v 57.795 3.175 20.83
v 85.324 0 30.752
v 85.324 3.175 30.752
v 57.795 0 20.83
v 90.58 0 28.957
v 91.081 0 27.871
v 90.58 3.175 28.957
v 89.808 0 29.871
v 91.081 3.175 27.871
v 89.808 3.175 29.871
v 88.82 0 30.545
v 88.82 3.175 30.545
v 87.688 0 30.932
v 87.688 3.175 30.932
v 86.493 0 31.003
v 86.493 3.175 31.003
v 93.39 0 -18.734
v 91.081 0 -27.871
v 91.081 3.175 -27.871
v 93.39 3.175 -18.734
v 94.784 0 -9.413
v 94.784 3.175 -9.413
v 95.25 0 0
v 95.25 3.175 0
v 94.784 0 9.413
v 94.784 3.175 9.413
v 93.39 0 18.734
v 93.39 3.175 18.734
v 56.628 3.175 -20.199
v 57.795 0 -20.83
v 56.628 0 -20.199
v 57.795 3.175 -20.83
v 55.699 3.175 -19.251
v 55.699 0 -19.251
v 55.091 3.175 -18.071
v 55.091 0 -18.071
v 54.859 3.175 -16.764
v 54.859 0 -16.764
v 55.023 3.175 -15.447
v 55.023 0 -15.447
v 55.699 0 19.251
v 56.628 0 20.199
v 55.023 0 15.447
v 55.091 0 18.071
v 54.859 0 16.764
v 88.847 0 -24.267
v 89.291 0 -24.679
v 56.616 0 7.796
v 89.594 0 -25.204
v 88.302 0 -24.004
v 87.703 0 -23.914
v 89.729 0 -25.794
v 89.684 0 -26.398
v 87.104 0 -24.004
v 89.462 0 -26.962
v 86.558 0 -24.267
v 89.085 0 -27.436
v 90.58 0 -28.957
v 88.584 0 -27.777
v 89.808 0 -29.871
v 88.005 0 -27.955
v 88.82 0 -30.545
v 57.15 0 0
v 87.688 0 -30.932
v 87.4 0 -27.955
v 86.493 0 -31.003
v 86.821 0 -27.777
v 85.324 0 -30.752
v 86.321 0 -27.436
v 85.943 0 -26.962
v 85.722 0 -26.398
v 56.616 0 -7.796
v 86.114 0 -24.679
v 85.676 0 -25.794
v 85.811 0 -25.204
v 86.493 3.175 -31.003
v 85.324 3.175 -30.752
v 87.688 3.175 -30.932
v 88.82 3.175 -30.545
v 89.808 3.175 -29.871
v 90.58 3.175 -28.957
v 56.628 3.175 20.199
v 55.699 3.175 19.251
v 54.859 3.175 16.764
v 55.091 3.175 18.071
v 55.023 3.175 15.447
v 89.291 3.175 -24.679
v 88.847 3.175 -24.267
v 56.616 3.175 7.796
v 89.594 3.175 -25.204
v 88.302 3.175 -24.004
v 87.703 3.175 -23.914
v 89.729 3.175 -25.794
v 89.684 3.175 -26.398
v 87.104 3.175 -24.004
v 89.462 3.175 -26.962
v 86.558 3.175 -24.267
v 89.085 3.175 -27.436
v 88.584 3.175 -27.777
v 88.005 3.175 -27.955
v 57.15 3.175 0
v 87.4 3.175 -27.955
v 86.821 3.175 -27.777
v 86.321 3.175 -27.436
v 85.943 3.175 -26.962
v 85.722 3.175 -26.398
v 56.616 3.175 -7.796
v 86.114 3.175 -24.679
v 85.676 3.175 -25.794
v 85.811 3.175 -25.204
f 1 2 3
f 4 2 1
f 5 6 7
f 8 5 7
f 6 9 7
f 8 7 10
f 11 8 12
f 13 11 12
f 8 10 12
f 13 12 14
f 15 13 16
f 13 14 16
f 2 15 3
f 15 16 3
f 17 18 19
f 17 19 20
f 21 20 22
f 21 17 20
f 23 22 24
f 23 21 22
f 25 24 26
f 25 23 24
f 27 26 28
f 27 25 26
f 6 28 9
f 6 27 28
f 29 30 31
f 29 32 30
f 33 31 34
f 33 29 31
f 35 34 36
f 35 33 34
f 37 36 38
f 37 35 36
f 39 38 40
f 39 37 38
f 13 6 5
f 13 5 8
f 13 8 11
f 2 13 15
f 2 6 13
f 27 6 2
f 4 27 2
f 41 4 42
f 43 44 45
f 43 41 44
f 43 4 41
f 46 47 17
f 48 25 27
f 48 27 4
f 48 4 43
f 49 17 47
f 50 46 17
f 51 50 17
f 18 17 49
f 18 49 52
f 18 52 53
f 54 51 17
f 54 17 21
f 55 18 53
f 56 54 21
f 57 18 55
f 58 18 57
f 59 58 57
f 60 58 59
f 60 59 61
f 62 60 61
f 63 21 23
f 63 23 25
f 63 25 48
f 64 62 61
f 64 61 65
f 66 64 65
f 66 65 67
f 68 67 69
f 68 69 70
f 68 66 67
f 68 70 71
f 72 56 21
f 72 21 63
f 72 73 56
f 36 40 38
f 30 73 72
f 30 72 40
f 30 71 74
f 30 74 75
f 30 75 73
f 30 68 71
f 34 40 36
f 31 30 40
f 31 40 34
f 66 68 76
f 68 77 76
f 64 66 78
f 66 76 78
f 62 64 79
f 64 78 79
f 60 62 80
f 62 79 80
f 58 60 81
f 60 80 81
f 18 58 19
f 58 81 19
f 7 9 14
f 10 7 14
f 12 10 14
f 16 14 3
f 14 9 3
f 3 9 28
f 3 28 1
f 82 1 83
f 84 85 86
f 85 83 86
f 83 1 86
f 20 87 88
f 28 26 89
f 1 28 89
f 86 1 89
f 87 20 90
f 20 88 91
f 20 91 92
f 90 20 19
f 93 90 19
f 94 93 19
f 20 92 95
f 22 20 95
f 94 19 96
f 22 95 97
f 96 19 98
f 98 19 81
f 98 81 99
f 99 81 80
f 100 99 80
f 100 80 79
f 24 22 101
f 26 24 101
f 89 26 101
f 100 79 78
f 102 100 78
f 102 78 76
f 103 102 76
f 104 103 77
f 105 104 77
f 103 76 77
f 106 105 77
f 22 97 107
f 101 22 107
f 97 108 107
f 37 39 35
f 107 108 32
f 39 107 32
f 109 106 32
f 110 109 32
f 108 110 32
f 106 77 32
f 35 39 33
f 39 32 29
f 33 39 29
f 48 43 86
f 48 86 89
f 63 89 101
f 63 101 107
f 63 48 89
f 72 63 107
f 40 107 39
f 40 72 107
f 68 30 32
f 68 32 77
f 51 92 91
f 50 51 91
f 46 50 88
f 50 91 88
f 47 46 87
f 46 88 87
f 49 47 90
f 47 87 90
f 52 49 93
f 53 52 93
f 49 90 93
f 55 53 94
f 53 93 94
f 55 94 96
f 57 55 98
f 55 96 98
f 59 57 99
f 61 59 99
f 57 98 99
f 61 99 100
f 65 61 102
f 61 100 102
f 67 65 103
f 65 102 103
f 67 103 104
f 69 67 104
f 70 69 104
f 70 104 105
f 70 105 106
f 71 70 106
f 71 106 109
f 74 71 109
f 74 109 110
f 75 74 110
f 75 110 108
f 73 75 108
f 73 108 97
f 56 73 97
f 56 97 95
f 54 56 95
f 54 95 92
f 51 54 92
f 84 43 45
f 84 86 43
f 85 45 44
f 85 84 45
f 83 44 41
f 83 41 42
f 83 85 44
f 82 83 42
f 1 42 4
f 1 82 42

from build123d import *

# Parameters (mm, degrees)
BOSS_EXTRUDE1_DEPTH = 3.175
SKETCH2_R           = 2.032
CUT_EXTRUDE1_DEPTH  = 101.626437428
FILLET1_R           = 4.445


with BuildPart() as part:
    # Sketch1 → Boss-Extrude1 (new body)
    with BuildSketch(Plane(origin=(0, 0, 0), x_dir=(1, 0, 0), z_dir=(0, 1, 0))):
        with BuildLine():
            Line((53.764572514, 19.37764801), (89.607620856, 32.296080017))
            ThreePointArc((89.607620856, 32.296080017), (95.25, 0), (89.607620856, -32.296080017))
            Line((89.607620856, -32.296080017), (53.764572514, -19.37764801))
            ThreePointArc((53.764572514, -19.37764801), (57.15, 0), (53.764572514, 19.37764801))
        make_face()
    extrude(amount=BOSS_EXTRUDE1_DEPTH)

    # Sketch2 → Cut-Extrude1 (cut, through all)
    with BuildSketch(Plane(origin=(0, 3.175, 0), x_dir=(1, 0, 0), z_dir=(0, 1, 0))):
        with Locations(Location((87.702620856, 25.946080017, 0), (0, 0, 270))):
            Circle(SKETCH2_R)
    extrude(amount=-CUT_EXTRUDE1_DEPTH, mode=Mode.SUBTRACT)

    # Fillet1
    fillet1_edges = [part.edges().sort_by_distance(p)[0] for p in [
        (53.764572514, 1.5875, -19.37764801),
        (89.607620856, 1.5875, -32.296080017),
        (89.607620856, 1.5875, 32.296080017),
        (53.764572514, 1.5875, 19.37764801),
    ]]
    fillet(fillet1_edges, radius=FILLET1_R)


solid = part.part
